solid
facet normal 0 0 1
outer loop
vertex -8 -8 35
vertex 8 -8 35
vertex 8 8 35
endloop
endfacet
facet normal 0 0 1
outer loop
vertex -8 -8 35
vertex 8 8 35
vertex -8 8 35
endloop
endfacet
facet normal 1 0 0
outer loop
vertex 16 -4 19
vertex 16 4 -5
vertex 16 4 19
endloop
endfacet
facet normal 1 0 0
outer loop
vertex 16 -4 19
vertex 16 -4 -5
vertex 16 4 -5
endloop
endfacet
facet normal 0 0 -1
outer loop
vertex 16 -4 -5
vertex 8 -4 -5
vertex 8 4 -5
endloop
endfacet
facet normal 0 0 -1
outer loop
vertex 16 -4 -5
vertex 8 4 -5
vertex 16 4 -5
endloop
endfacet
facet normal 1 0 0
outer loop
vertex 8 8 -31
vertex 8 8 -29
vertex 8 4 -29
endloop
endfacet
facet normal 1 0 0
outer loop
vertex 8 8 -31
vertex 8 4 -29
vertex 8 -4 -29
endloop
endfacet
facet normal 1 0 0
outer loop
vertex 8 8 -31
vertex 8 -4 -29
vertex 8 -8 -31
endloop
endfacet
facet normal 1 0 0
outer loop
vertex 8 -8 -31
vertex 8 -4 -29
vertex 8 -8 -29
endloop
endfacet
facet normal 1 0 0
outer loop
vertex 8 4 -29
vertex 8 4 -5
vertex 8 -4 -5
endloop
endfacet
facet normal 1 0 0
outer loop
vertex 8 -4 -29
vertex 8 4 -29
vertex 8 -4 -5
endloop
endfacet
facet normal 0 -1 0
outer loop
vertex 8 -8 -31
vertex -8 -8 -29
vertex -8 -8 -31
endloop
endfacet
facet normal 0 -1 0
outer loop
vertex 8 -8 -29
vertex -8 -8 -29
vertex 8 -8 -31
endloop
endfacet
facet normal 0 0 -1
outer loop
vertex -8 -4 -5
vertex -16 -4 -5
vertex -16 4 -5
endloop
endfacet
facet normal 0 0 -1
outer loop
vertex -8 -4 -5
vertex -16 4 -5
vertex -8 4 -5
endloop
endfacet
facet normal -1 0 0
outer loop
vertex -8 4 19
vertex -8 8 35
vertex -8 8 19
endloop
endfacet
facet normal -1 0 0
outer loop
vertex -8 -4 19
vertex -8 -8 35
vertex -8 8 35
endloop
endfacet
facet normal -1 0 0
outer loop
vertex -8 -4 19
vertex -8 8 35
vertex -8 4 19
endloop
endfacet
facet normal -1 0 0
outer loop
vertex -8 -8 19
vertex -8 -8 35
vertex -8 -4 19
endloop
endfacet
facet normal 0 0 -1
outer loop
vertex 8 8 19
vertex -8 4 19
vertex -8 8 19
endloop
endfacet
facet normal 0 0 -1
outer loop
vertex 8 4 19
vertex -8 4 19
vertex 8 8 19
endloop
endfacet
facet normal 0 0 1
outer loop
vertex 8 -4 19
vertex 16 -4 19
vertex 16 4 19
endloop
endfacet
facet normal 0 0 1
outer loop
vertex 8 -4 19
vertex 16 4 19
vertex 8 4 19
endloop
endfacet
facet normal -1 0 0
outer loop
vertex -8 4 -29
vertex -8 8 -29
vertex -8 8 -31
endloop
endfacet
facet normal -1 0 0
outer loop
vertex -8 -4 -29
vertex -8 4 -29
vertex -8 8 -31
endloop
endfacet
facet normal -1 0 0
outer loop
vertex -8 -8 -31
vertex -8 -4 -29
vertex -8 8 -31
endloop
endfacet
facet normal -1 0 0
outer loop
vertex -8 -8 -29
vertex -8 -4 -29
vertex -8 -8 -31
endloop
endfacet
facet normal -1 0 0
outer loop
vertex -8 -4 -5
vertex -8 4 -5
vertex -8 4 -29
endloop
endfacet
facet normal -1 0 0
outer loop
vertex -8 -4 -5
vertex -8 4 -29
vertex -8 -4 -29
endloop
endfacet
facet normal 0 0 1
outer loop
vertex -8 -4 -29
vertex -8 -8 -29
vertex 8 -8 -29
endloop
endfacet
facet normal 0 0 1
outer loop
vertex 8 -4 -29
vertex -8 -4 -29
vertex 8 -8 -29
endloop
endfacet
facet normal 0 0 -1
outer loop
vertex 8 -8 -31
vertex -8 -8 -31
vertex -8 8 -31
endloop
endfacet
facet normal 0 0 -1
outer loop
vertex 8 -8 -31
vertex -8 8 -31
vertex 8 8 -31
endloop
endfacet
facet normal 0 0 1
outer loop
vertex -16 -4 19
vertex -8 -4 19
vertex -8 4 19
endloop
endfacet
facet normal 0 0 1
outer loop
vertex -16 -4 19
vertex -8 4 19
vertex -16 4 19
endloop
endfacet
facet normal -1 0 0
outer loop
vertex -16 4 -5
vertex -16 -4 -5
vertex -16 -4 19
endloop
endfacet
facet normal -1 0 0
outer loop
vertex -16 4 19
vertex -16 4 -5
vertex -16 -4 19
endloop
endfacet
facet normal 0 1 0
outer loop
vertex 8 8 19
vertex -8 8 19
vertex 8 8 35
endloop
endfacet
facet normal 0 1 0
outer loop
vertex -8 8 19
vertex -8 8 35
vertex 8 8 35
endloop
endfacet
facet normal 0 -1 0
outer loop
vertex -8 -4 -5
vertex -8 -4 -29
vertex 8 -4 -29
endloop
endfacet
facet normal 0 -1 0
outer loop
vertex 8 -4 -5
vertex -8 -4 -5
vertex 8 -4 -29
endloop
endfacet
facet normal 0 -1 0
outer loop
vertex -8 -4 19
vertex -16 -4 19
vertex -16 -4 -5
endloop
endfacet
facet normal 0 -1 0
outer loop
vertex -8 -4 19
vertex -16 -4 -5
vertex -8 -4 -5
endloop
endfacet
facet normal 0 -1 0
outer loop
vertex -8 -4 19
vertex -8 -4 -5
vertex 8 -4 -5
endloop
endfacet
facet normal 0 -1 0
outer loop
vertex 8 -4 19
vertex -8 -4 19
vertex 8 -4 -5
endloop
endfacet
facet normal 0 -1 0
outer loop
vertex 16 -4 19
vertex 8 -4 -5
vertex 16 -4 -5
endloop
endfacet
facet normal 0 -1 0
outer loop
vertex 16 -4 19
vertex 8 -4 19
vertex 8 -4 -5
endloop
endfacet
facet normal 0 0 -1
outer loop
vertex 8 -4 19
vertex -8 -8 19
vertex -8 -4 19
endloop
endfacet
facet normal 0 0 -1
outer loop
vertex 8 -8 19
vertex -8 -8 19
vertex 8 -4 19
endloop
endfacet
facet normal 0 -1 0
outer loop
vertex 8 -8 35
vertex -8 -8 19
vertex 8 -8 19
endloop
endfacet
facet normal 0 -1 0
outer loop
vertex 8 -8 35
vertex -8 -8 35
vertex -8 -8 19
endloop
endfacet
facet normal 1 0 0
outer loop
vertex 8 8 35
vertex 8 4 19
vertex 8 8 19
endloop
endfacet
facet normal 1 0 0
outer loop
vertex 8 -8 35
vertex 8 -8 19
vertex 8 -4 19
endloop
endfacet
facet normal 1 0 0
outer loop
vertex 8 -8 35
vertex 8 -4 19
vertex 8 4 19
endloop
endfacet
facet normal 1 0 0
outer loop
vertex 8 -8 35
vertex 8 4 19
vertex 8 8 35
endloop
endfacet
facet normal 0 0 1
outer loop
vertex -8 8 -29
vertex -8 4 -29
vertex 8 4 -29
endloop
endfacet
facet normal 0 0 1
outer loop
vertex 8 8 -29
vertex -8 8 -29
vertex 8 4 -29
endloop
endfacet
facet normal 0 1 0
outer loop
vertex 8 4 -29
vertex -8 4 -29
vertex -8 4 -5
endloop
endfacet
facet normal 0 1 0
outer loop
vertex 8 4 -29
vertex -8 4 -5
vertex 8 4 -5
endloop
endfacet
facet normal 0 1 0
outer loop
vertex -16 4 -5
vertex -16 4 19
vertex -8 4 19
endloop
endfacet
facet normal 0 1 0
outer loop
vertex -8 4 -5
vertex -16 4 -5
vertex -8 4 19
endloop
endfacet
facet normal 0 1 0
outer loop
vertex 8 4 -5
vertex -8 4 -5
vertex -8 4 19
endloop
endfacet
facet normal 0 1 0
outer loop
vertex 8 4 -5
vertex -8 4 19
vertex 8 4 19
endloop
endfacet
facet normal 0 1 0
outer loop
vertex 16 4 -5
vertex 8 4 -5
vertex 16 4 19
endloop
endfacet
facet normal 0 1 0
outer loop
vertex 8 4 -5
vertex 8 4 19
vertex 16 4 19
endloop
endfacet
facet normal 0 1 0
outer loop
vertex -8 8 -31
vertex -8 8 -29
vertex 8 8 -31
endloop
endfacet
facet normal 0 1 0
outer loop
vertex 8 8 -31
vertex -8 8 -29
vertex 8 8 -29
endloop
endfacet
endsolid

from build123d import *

# Parameters (mm, degrees)
F0_W     = 8
F0_H     = 24
F1_DEPTH = 4
F2_DEPTH = 8
F3_W     = 16
F3_H     = 16
F4_DEPTH = 2


with BuildPart() as f1:
    # F0 (on Front) → F1 (new body, symmetric)
    with BuildSketch(Plane.XZ):
        with Locations((-4, 7)):
            Rectangle(F0_W, F0_H)
        with Locations((-12, 7)):
            Rectangle(F0_W, F0_H)
        with Locations((4, 7)):
            Rectangle(F0_W, F0_H)
        with Locations((12, 7)):
            Rectangle(F0_W, F0_H)
        with Locations((4, -17)):
            Rectangle(F0_W, F0_H)
        with Locations((-4, -17)):
            Rectangle(F0_W, F0_H)
    extrude(amount=F1_DEPTH, both=True)

    # F0 (on Front) → F2 (join, symmetric)
    with BuildSketch(Plane.XZ):
        Polygon((-8, 19), (0, 19), (8, 19), (8, 35), (-8, 35), align=None)
    extrude(amount=F2_DEPTH, both=True)

    # F3 (on face) → F4 (join)
    with BuildSketch(Plane(origin=(0, 0, -29), x_dir=(1, 0, 0), z_dir=(0, 0, -1))):
        Rectangle(F3_W, F3_H)
    extrude(amount=F4_DEPTH)


solid = f1.part
